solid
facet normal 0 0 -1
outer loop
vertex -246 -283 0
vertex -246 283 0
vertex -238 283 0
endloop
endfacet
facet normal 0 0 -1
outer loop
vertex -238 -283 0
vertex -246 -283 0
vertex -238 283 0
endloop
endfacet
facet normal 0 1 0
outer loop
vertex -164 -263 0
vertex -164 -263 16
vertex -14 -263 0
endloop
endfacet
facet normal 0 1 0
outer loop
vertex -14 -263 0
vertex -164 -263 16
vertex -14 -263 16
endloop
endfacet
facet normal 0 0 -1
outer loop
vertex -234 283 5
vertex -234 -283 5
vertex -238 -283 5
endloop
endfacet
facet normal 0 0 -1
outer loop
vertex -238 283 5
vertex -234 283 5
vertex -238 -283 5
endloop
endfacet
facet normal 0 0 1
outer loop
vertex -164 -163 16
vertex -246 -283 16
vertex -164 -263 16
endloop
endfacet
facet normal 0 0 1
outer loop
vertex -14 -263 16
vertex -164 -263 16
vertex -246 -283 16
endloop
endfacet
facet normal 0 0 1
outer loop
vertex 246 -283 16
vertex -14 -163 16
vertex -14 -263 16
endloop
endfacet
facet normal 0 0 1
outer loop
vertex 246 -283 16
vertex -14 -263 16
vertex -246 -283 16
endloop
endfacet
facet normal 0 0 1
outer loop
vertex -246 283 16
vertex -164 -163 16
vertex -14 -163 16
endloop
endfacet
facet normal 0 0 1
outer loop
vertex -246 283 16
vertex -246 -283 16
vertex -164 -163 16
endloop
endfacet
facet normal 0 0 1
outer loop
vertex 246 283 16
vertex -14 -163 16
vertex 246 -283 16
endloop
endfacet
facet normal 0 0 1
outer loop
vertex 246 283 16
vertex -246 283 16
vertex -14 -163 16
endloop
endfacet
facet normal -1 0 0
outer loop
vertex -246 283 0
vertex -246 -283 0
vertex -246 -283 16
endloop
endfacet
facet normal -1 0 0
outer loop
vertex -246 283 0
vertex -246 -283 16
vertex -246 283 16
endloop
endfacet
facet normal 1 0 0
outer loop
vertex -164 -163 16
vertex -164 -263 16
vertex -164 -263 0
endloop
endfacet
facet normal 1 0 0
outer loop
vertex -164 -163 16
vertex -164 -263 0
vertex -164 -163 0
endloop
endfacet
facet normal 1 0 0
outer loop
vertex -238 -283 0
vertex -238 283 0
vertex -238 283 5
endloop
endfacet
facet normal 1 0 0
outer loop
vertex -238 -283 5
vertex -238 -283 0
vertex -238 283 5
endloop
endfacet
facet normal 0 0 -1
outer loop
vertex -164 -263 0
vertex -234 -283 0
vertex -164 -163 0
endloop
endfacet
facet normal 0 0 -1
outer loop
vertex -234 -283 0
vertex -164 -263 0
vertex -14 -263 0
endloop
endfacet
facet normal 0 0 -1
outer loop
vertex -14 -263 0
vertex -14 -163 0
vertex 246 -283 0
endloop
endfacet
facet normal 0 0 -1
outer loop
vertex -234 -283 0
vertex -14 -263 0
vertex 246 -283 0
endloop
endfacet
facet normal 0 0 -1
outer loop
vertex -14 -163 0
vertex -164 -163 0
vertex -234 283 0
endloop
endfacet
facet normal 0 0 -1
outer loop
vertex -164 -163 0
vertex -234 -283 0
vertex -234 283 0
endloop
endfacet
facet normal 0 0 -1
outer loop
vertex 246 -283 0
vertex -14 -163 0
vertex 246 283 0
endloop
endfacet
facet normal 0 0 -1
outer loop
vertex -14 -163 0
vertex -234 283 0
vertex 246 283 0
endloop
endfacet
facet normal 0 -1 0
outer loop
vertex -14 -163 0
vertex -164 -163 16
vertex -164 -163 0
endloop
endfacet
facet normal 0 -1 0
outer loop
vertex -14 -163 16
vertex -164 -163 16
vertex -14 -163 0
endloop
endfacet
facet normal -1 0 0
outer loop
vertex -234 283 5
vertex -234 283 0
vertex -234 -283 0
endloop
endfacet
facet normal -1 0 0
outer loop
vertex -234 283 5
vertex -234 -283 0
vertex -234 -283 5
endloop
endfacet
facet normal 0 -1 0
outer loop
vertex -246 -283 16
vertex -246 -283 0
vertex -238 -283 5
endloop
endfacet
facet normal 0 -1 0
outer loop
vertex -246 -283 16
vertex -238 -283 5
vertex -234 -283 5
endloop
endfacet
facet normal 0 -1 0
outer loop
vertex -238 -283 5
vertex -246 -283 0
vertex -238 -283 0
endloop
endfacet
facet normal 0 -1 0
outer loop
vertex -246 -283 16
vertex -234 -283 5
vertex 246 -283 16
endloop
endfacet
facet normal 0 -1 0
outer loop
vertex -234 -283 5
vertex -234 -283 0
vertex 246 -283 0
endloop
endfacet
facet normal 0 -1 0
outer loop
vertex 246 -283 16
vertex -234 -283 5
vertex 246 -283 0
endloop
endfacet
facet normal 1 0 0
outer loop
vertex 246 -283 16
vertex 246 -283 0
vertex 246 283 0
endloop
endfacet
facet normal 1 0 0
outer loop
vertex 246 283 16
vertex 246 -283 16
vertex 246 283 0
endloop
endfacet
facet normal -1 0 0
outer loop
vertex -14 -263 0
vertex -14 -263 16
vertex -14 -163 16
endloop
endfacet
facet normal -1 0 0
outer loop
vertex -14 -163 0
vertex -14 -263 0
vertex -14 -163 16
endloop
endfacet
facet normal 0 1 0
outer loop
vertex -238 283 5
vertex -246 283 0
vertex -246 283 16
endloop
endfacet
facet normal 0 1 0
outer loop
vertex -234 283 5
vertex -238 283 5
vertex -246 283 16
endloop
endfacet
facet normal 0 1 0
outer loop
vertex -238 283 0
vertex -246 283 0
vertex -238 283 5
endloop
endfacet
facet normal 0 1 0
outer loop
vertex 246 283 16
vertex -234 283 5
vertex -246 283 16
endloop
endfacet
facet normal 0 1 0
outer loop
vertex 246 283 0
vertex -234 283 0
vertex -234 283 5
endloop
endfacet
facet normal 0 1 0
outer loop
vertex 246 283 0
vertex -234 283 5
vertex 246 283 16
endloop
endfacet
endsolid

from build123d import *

# Parameters (mm, degrees)
F0_W     = 492
F0_H     = 566
F1_DEPTH = 16
F2_W     = 150
F2_H     = 100
F3_DEPTH = 16.001
F4_W     = 4
F4_H     = 5
F5_DEPTH = 566.001


with BuildPart() as f1:
    # F0 (on Top) → F1 (new body)
    with BuildSketch(Plane.XY):
        Rectangle(F0_W, F0_H)
    extrude(amount=F1_DEPTH)

    # F2 (on face) → F3 (cut, through all)
    with BuildSketch(Plane.XY.offset(16)):
        with Locations((-89, -213)):
            Rectangle(F2_W, F2_H)
    extrude(amount=-F3_DEPTH, mode=Mode.SUBTRACT)

    # F4 (on face) → F5 (cut, through all)
    with BuildSketch(Plane(origin=(0, 283, 0), x_dir=(-1, 0, 0), z_dir=(0, 1, 0))):
        with Locations((236, 2.5)):
            Rectangle(F4_W, F4_H)
    extrude(amount=-F5_DEPTH, mode=Mode.SUBTRACT)


solid = f1.part
